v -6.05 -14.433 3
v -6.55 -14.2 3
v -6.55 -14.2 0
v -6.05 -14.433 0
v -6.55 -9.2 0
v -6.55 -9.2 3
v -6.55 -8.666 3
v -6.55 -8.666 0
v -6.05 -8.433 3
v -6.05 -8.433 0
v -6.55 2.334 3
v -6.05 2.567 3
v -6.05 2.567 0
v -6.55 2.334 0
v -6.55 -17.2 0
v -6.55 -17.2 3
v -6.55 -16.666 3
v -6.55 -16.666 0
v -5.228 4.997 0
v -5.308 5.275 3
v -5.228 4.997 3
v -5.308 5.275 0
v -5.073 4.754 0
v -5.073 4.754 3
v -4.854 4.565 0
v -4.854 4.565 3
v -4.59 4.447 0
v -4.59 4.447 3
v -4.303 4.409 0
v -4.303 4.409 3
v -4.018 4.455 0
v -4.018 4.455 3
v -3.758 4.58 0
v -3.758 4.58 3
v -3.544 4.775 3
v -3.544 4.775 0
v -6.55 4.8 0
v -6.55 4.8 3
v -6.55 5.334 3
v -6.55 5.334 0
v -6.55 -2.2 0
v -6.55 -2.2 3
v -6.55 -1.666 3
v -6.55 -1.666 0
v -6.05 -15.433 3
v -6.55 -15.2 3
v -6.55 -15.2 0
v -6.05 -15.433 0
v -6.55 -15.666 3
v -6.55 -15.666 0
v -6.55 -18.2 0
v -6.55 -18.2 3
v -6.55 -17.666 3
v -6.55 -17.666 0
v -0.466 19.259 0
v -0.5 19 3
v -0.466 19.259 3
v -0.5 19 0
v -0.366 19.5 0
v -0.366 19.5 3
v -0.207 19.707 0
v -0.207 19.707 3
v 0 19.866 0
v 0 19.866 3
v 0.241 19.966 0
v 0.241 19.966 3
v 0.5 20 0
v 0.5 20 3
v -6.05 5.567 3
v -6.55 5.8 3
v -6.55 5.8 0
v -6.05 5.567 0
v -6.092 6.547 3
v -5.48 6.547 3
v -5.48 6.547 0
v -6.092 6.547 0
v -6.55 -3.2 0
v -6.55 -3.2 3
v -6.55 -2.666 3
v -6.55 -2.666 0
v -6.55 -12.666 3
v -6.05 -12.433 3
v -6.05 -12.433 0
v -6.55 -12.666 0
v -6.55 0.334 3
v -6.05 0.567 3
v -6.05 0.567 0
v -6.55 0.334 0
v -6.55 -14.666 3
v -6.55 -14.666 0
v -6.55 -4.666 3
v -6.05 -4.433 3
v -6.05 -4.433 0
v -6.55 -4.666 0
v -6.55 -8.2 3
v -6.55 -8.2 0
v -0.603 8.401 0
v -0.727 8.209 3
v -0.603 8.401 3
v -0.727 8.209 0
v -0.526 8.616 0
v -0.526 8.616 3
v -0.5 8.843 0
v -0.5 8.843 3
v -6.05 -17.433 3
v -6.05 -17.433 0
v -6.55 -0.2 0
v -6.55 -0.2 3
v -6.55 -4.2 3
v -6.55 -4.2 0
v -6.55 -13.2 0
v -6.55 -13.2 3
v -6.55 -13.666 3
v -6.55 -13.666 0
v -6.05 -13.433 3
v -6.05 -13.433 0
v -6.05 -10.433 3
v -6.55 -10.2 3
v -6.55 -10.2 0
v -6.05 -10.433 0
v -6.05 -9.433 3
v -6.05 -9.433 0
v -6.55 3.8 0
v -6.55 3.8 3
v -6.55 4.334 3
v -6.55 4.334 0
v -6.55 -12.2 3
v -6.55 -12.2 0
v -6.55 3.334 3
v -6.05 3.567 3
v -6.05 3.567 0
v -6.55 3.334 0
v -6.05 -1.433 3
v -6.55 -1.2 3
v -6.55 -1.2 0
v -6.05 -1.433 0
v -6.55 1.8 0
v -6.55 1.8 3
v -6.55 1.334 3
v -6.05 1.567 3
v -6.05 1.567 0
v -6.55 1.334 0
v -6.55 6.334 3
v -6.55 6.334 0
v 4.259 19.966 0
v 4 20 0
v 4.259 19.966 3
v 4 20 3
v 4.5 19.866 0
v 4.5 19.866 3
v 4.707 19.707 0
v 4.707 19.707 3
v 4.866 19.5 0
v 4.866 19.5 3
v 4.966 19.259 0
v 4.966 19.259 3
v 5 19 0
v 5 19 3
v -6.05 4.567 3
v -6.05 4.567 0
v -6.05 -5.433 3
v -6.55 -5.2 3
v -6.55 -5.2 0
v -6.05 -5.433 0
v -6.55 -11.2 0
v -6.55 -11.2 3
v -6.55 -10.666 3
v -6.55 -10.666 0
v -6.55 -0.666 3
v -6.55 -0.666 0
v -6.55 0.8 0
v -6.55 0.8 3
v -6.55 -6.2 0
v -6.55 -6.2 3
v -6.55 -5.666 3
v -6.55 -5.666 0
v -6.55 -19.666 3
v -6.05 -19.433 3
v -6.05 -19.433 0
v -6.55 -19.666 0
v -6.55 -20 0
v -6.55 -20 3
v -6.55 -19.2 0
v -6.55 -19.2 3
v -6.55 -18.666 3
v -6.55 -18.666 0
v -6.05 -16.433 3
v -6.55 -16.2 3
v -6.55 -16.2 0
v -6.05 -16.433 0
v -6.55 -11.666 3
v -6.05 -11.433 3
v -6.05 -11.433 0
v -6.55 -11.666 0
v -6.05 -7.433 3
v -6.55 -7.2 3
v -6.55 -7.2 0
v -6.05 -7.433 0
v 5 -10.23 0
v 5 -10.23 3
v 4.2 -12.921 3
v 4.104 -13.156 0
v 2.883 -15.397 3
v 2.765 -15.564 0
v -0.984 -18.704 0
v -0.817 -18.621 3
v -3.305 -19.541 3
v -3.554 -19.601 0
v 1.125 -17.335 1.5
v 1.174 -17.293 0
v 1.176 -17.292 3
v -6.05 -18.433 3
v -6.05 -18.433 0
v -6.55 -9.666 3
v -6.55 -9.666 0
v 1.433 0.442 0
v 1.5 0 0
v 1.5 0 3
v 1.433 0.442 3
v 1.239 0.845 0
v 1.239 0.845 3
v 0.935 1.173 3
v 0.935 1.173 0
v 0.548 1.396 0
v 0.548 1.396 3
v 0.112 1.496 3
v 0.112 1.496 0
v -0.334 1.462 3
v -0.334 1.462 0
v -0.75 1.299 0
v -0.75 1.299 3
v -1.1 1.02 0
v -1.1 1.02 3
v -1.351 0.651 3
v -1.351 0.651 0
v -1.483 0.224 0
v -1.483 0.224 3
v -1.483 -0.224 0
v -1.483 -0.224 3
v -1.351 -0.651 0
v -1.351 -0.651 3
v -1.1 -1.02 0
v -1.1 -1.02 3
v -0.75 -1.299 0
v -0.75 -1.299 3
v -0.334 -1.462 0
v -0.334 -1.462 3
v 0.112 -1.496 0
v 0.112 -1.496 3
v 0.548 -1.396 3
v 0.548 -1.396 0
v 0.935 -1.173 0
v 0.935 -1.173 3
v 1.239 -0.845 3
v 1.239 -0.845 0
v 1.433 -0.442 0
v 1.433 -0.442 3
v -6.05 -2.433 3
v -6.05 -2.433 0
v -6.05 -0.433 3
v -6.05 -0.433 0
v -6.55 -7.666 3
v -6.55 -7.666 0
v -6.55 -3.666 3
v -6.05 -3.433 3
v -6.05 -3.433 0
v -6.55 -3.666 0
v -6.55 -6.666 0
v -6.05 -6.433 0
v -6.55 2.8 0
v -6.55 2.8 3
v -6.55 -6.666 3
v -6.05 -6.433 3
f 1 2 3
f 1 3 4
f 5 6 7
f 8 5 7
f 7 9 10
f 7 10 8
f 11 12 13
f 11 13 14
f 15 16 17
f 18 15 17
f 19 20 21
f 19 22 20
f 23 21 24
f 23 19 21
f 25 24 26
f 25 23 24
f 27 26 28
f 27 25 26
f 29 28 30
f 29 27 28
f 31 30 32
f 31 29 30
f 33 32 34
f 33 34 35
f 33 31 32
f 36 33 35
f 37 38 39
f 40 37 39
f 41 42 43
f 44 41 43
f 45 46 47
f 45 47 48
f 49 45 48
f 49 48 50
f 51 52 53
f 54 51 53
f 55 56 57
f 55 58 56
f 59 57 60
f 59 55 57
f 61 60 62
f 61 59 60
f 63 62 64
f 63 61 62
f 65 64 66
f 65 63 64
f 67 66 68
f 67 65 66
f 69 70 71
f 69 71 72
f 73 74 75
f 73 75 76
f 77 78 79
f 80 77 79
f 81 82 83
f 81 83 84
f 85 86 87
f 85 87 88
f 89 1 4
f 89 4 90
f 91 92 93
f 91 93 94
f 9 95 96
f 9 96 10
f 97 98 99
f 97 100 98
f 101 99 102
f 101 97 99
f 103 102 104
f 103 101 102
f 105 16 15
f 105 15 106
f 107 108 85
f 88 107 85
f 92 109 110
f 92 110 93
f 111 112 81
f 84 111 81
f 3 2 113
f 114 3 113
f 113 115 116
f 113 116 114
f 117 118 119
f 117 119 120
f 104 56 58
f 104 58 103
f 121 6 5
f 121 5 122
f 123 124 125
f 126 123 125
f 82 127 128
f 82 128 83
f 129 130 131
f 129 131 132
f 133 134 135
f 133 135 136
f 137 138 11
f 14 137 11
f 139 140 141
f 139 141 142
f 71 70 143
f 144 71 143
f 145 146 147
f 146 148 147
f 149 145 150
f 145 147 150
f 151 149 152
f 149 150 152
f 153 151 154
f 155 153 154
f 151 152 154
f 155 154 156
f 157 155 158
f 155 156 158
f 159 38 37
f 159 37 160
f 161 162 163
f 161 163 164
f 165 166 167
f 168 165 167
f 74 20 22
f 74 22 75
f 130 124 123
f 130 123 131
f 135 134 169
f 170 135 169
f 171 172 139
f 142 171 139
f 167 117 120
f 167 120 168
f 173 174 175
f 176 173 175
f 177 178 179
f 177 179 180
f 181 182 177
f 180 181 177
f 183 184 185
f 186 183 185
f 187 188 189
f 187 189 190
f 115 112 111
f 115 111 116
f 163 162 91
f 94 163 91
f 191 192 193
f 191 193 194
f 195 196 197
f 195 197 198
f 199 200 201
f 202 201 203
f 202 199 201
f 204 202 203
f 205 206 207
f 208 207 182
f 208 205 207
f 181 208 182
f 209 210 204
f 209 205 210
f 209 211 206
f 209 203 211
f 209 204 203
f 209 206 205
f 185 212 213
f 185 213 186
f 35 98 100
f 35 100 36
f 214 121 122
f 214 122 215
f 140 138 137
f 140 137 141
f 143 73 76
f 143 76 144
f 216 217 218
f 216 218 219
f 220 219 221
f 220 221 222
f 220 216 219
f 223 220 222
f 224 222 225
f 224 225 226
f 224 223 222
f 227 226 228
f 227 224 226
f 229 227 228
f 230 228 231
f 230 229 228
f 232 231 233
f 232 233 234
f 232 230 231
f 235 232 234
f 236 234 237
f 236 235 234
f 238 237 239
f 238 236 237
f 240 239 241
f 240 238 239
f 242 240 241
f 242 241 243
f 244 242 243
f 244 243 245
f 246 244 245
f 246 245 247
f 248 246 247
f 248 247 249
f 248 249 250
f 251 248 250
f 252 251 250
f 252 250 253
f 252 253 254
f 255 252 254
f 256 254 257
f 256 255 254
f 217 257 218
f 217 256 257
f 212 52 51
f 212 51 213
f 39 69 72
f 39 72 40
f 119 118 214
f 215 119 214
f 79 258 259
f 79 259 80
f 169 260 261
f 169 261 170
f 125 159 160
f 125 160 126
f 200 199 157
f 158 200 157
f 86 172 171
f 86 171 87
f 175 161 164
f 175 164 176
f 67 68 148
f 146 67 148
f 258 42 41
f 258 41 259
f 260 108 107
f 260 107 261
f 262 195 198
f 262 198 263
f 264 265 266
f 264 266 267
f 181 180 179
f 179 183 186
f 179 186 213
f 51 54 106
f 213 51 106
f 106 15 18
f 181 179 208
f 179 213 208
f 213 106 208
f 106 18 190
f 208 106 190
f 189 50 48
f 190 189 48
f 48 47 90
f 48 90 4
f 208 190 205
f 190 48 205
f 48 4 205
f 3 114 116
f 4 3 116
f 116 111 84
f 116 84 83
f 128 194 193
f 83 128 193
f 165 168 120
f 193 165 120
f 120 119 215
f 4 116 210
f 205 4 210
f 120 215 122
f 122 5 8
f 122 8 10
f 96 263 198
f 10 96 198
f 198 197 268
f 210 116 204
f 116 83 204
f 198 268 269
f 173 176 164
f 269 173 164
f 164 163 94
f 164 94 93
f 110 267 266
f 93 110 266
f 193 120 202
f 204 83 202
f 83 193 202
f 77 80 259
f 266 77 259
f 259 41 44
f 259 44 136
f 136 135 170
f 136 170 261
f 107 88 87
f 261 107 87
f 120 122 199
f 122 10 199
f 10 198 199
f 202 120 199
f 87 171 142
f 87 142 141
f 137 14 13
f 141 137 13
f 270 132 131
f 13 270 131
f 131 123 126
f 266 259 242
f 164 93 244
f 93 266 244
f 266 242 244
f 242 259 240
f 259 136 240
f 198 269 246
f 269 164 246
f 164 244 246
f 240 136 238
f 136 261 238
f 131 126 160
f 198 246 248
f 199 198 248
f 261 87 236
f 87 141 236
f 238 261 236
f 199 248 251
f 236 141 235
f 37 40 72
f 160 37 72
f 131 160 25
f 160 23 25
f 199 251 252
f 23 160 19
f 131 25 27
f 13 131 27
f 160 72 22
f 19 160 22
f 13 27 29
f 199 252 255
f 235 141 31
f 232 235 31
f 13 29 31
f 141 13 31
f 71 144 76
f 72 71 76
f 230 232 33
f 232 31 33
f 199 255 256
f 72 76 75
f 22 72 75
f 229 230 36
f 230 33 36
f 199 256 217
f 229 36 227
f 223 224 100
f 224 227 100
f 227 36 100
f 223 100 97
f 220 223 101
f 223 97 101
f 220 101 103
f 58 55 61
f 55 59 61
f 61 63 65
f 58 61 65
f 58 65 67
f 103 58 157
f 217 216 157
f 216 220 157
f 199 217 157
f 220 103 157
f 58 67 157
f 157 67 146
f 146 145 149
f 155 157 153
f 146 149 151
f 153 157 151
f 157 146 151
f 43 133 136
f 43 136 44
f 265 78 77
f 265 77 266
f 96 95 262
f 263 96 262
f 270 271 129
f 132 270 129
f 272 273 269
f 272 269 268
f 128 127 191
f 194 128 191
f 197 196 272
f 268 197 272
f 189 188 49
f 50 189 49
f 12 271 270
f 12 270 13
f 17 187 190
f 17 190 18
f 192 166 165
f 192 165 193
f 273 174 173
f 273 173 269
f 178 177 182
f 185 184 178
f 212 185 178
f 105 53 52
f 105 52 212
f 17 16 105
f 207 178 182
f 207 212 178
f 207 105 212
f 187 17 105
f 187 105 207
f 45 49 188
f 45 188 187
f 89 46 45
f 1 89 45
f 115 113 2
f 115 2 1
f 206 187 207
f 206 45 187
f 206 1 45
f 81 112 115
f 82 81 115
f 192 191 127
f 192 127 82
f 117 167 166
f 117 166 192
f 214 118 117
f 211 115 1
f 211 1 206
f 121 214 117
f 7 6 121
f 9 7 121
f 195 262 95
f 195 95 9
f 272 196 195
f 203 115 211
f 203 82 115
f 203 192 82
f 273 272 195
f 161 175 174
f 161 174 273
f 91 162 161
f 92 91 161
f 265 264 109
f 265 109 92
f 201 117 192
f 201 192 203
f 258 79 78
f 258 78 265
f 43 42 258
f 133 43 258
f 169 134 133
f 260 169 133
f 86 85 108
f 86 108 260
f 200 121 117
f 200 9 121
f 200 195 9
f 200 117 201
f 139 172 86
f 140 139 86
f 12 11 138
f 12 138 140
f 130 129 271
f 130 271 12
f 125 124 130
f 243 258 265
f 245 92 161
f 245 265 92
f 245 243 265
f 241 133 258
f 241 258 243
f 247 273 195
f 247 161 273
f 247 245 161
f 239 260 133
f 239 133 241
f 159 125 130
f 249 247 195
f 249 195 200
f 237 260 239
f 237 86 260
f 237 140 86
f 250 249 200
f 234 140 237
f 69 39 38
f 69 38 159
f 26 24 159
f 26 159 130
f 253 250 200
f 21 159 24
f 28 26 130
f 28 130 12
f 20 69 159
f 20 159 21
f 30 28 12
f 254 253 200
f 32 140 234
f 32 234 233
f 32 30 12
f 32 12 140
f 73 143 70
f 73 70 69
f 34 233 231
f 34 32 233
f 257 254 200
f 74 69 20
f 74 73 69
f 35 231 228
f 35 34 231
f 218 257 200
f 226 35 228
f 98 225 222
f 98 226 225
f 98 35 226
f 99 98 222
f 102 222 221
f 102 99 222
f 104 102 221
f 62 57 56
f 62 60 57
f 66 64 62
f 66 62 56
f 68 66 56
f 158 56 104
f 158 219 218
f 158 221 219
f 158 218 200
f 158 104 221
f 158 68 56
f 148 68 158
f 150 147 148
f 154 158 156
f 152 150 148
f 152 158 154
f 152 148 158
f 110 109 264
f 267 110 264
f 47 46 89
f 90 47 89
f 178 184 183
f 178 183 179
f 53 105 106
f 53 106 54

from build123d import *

# Parameters (mm, degrees)
SKETCH_1_W             = 10
SKETCH_1_H             = 40
SKETCH_1_R             = 1.5
EXTRUDE_1_DEPTH        = 3
SKETCH_2_W             = 1.55
SKETCH_2_H             = 40
EXTRUDE_2_DEPTH        = 3
CUT_EXTRUDE_1_DEPTH    = 3
PATTERN_LINEAR_1_COUNT = 40
PATTERN_LINEAR_1_PITCH = 1
CUT_EXTRUDE_2_DEPTH    = 10
FILLET_1_R             = 1
CUT_EXTRUDE_3_DEPTH    = 10
FILLET_2_R             = 1


with BuildPart() as part:
    # 草图1 → 凸台-拉伸1 (new body)
    with BuildSketch(Plane.XY):
        Rectangle(SKETCH_1_W, SKETCH_1_H)
        Circle(SKETCH_1_R, mode=Mode.SUBTRACT)
    extrude(amount=EXTRUDE_1_DEPTH)

    # 草图2 → 凸台-拉伸2 (add)
    with BuildSketch(Plane.XY.offset(3)):
        with Locations((-5.775, 0)):
            Rectangle(SKETCH_2_W, SKETCH_2_H)
    extrude(amount=-EXTRUDE_2_DEPTH)

    # 草图3 → 切除-拉伸1 (cut)
    with BuildSketch(Plane.XY.offset(3)):
        Polygon((-6.55, 19.8), (-6.05, 19.566846171), (-6.55, 19.333692342), align=None)
    cut_extrude_1 = extrude(amount=-CUT_EXTRUDE_1_DEPTH, mode=Mode.SUBTRACT)

    # 阵列(线性)1: 切除-拉伸1 ×40
    with Locations(*[(0, -i * PATTERN_LINEAR_1_PITCH, 0) for i in range(1, PATTERN_LINEAR_1_COUNT)]):
        add(cut_extrude_1, mode=Mode.SUBTRACT)

    # 草图5 → 切除-拉伸2 (cut)
    with BuildSketch(Plane.XY.offset(3)):
        Polygon((-0.5, 20), (-0.5, 8.485281374), (-5, 3), (-5.480467746, 6.547419937), (-7.040068743, 6.547419937), (-7.040068743, 9.445607815), (-8.18437591, 20), align=None)
    extrude(amount=-CUT_EXTRUDE_2_DEPTH, mode=Mode.SUBTRACT)

    # 圆角1
    fillet_1_edges = [part.edges().sort_by_distance(p)[0] for p in [
        (-0.5, 8.485281374, 1.5),
        (-5, 3, 1.5),
    ]]
    fillet(fillet_1_edges, radius=FILLET_1_R)

    # 草图7 → 切除-拉伸3 (cut)
    with BuildSketch(Plane(origin=(0, 0, 0), x_dir=(-1, 0, 0), z_dir=(0, 0, -1))):
        with BuildLine():
            Line((6.55, -20), (-5.418170251, -22.566873238))
            Line((-5.418170251, -22.566873238), (-10.062870934, -14.075772272))
            Line((-10.062870934, -14.075772272), (-5, -10.23011241))
            add(Edge.make_bspline(
                [(-5, -10.23011241), (-3.025837533, -19.554793567), (6.55, -20)],
                knots=[0, 0, 0, 1, 1, 1], degree=2))
        make_face()
    extrude(amount=-CUT_EXTRUDE_3_DEPTH, mode=Mode.SUBTRACT)

    # 圆角2
    fillet_2_edges = [part.edges().sort_by_distance(p)[0] for p in [
        (-0.5, 20, 1.5),
        (5, 20, 1.5),
    ]]
    fillet(fillet_2_edges, radius=FILLET_2_R)


solid = part.part
